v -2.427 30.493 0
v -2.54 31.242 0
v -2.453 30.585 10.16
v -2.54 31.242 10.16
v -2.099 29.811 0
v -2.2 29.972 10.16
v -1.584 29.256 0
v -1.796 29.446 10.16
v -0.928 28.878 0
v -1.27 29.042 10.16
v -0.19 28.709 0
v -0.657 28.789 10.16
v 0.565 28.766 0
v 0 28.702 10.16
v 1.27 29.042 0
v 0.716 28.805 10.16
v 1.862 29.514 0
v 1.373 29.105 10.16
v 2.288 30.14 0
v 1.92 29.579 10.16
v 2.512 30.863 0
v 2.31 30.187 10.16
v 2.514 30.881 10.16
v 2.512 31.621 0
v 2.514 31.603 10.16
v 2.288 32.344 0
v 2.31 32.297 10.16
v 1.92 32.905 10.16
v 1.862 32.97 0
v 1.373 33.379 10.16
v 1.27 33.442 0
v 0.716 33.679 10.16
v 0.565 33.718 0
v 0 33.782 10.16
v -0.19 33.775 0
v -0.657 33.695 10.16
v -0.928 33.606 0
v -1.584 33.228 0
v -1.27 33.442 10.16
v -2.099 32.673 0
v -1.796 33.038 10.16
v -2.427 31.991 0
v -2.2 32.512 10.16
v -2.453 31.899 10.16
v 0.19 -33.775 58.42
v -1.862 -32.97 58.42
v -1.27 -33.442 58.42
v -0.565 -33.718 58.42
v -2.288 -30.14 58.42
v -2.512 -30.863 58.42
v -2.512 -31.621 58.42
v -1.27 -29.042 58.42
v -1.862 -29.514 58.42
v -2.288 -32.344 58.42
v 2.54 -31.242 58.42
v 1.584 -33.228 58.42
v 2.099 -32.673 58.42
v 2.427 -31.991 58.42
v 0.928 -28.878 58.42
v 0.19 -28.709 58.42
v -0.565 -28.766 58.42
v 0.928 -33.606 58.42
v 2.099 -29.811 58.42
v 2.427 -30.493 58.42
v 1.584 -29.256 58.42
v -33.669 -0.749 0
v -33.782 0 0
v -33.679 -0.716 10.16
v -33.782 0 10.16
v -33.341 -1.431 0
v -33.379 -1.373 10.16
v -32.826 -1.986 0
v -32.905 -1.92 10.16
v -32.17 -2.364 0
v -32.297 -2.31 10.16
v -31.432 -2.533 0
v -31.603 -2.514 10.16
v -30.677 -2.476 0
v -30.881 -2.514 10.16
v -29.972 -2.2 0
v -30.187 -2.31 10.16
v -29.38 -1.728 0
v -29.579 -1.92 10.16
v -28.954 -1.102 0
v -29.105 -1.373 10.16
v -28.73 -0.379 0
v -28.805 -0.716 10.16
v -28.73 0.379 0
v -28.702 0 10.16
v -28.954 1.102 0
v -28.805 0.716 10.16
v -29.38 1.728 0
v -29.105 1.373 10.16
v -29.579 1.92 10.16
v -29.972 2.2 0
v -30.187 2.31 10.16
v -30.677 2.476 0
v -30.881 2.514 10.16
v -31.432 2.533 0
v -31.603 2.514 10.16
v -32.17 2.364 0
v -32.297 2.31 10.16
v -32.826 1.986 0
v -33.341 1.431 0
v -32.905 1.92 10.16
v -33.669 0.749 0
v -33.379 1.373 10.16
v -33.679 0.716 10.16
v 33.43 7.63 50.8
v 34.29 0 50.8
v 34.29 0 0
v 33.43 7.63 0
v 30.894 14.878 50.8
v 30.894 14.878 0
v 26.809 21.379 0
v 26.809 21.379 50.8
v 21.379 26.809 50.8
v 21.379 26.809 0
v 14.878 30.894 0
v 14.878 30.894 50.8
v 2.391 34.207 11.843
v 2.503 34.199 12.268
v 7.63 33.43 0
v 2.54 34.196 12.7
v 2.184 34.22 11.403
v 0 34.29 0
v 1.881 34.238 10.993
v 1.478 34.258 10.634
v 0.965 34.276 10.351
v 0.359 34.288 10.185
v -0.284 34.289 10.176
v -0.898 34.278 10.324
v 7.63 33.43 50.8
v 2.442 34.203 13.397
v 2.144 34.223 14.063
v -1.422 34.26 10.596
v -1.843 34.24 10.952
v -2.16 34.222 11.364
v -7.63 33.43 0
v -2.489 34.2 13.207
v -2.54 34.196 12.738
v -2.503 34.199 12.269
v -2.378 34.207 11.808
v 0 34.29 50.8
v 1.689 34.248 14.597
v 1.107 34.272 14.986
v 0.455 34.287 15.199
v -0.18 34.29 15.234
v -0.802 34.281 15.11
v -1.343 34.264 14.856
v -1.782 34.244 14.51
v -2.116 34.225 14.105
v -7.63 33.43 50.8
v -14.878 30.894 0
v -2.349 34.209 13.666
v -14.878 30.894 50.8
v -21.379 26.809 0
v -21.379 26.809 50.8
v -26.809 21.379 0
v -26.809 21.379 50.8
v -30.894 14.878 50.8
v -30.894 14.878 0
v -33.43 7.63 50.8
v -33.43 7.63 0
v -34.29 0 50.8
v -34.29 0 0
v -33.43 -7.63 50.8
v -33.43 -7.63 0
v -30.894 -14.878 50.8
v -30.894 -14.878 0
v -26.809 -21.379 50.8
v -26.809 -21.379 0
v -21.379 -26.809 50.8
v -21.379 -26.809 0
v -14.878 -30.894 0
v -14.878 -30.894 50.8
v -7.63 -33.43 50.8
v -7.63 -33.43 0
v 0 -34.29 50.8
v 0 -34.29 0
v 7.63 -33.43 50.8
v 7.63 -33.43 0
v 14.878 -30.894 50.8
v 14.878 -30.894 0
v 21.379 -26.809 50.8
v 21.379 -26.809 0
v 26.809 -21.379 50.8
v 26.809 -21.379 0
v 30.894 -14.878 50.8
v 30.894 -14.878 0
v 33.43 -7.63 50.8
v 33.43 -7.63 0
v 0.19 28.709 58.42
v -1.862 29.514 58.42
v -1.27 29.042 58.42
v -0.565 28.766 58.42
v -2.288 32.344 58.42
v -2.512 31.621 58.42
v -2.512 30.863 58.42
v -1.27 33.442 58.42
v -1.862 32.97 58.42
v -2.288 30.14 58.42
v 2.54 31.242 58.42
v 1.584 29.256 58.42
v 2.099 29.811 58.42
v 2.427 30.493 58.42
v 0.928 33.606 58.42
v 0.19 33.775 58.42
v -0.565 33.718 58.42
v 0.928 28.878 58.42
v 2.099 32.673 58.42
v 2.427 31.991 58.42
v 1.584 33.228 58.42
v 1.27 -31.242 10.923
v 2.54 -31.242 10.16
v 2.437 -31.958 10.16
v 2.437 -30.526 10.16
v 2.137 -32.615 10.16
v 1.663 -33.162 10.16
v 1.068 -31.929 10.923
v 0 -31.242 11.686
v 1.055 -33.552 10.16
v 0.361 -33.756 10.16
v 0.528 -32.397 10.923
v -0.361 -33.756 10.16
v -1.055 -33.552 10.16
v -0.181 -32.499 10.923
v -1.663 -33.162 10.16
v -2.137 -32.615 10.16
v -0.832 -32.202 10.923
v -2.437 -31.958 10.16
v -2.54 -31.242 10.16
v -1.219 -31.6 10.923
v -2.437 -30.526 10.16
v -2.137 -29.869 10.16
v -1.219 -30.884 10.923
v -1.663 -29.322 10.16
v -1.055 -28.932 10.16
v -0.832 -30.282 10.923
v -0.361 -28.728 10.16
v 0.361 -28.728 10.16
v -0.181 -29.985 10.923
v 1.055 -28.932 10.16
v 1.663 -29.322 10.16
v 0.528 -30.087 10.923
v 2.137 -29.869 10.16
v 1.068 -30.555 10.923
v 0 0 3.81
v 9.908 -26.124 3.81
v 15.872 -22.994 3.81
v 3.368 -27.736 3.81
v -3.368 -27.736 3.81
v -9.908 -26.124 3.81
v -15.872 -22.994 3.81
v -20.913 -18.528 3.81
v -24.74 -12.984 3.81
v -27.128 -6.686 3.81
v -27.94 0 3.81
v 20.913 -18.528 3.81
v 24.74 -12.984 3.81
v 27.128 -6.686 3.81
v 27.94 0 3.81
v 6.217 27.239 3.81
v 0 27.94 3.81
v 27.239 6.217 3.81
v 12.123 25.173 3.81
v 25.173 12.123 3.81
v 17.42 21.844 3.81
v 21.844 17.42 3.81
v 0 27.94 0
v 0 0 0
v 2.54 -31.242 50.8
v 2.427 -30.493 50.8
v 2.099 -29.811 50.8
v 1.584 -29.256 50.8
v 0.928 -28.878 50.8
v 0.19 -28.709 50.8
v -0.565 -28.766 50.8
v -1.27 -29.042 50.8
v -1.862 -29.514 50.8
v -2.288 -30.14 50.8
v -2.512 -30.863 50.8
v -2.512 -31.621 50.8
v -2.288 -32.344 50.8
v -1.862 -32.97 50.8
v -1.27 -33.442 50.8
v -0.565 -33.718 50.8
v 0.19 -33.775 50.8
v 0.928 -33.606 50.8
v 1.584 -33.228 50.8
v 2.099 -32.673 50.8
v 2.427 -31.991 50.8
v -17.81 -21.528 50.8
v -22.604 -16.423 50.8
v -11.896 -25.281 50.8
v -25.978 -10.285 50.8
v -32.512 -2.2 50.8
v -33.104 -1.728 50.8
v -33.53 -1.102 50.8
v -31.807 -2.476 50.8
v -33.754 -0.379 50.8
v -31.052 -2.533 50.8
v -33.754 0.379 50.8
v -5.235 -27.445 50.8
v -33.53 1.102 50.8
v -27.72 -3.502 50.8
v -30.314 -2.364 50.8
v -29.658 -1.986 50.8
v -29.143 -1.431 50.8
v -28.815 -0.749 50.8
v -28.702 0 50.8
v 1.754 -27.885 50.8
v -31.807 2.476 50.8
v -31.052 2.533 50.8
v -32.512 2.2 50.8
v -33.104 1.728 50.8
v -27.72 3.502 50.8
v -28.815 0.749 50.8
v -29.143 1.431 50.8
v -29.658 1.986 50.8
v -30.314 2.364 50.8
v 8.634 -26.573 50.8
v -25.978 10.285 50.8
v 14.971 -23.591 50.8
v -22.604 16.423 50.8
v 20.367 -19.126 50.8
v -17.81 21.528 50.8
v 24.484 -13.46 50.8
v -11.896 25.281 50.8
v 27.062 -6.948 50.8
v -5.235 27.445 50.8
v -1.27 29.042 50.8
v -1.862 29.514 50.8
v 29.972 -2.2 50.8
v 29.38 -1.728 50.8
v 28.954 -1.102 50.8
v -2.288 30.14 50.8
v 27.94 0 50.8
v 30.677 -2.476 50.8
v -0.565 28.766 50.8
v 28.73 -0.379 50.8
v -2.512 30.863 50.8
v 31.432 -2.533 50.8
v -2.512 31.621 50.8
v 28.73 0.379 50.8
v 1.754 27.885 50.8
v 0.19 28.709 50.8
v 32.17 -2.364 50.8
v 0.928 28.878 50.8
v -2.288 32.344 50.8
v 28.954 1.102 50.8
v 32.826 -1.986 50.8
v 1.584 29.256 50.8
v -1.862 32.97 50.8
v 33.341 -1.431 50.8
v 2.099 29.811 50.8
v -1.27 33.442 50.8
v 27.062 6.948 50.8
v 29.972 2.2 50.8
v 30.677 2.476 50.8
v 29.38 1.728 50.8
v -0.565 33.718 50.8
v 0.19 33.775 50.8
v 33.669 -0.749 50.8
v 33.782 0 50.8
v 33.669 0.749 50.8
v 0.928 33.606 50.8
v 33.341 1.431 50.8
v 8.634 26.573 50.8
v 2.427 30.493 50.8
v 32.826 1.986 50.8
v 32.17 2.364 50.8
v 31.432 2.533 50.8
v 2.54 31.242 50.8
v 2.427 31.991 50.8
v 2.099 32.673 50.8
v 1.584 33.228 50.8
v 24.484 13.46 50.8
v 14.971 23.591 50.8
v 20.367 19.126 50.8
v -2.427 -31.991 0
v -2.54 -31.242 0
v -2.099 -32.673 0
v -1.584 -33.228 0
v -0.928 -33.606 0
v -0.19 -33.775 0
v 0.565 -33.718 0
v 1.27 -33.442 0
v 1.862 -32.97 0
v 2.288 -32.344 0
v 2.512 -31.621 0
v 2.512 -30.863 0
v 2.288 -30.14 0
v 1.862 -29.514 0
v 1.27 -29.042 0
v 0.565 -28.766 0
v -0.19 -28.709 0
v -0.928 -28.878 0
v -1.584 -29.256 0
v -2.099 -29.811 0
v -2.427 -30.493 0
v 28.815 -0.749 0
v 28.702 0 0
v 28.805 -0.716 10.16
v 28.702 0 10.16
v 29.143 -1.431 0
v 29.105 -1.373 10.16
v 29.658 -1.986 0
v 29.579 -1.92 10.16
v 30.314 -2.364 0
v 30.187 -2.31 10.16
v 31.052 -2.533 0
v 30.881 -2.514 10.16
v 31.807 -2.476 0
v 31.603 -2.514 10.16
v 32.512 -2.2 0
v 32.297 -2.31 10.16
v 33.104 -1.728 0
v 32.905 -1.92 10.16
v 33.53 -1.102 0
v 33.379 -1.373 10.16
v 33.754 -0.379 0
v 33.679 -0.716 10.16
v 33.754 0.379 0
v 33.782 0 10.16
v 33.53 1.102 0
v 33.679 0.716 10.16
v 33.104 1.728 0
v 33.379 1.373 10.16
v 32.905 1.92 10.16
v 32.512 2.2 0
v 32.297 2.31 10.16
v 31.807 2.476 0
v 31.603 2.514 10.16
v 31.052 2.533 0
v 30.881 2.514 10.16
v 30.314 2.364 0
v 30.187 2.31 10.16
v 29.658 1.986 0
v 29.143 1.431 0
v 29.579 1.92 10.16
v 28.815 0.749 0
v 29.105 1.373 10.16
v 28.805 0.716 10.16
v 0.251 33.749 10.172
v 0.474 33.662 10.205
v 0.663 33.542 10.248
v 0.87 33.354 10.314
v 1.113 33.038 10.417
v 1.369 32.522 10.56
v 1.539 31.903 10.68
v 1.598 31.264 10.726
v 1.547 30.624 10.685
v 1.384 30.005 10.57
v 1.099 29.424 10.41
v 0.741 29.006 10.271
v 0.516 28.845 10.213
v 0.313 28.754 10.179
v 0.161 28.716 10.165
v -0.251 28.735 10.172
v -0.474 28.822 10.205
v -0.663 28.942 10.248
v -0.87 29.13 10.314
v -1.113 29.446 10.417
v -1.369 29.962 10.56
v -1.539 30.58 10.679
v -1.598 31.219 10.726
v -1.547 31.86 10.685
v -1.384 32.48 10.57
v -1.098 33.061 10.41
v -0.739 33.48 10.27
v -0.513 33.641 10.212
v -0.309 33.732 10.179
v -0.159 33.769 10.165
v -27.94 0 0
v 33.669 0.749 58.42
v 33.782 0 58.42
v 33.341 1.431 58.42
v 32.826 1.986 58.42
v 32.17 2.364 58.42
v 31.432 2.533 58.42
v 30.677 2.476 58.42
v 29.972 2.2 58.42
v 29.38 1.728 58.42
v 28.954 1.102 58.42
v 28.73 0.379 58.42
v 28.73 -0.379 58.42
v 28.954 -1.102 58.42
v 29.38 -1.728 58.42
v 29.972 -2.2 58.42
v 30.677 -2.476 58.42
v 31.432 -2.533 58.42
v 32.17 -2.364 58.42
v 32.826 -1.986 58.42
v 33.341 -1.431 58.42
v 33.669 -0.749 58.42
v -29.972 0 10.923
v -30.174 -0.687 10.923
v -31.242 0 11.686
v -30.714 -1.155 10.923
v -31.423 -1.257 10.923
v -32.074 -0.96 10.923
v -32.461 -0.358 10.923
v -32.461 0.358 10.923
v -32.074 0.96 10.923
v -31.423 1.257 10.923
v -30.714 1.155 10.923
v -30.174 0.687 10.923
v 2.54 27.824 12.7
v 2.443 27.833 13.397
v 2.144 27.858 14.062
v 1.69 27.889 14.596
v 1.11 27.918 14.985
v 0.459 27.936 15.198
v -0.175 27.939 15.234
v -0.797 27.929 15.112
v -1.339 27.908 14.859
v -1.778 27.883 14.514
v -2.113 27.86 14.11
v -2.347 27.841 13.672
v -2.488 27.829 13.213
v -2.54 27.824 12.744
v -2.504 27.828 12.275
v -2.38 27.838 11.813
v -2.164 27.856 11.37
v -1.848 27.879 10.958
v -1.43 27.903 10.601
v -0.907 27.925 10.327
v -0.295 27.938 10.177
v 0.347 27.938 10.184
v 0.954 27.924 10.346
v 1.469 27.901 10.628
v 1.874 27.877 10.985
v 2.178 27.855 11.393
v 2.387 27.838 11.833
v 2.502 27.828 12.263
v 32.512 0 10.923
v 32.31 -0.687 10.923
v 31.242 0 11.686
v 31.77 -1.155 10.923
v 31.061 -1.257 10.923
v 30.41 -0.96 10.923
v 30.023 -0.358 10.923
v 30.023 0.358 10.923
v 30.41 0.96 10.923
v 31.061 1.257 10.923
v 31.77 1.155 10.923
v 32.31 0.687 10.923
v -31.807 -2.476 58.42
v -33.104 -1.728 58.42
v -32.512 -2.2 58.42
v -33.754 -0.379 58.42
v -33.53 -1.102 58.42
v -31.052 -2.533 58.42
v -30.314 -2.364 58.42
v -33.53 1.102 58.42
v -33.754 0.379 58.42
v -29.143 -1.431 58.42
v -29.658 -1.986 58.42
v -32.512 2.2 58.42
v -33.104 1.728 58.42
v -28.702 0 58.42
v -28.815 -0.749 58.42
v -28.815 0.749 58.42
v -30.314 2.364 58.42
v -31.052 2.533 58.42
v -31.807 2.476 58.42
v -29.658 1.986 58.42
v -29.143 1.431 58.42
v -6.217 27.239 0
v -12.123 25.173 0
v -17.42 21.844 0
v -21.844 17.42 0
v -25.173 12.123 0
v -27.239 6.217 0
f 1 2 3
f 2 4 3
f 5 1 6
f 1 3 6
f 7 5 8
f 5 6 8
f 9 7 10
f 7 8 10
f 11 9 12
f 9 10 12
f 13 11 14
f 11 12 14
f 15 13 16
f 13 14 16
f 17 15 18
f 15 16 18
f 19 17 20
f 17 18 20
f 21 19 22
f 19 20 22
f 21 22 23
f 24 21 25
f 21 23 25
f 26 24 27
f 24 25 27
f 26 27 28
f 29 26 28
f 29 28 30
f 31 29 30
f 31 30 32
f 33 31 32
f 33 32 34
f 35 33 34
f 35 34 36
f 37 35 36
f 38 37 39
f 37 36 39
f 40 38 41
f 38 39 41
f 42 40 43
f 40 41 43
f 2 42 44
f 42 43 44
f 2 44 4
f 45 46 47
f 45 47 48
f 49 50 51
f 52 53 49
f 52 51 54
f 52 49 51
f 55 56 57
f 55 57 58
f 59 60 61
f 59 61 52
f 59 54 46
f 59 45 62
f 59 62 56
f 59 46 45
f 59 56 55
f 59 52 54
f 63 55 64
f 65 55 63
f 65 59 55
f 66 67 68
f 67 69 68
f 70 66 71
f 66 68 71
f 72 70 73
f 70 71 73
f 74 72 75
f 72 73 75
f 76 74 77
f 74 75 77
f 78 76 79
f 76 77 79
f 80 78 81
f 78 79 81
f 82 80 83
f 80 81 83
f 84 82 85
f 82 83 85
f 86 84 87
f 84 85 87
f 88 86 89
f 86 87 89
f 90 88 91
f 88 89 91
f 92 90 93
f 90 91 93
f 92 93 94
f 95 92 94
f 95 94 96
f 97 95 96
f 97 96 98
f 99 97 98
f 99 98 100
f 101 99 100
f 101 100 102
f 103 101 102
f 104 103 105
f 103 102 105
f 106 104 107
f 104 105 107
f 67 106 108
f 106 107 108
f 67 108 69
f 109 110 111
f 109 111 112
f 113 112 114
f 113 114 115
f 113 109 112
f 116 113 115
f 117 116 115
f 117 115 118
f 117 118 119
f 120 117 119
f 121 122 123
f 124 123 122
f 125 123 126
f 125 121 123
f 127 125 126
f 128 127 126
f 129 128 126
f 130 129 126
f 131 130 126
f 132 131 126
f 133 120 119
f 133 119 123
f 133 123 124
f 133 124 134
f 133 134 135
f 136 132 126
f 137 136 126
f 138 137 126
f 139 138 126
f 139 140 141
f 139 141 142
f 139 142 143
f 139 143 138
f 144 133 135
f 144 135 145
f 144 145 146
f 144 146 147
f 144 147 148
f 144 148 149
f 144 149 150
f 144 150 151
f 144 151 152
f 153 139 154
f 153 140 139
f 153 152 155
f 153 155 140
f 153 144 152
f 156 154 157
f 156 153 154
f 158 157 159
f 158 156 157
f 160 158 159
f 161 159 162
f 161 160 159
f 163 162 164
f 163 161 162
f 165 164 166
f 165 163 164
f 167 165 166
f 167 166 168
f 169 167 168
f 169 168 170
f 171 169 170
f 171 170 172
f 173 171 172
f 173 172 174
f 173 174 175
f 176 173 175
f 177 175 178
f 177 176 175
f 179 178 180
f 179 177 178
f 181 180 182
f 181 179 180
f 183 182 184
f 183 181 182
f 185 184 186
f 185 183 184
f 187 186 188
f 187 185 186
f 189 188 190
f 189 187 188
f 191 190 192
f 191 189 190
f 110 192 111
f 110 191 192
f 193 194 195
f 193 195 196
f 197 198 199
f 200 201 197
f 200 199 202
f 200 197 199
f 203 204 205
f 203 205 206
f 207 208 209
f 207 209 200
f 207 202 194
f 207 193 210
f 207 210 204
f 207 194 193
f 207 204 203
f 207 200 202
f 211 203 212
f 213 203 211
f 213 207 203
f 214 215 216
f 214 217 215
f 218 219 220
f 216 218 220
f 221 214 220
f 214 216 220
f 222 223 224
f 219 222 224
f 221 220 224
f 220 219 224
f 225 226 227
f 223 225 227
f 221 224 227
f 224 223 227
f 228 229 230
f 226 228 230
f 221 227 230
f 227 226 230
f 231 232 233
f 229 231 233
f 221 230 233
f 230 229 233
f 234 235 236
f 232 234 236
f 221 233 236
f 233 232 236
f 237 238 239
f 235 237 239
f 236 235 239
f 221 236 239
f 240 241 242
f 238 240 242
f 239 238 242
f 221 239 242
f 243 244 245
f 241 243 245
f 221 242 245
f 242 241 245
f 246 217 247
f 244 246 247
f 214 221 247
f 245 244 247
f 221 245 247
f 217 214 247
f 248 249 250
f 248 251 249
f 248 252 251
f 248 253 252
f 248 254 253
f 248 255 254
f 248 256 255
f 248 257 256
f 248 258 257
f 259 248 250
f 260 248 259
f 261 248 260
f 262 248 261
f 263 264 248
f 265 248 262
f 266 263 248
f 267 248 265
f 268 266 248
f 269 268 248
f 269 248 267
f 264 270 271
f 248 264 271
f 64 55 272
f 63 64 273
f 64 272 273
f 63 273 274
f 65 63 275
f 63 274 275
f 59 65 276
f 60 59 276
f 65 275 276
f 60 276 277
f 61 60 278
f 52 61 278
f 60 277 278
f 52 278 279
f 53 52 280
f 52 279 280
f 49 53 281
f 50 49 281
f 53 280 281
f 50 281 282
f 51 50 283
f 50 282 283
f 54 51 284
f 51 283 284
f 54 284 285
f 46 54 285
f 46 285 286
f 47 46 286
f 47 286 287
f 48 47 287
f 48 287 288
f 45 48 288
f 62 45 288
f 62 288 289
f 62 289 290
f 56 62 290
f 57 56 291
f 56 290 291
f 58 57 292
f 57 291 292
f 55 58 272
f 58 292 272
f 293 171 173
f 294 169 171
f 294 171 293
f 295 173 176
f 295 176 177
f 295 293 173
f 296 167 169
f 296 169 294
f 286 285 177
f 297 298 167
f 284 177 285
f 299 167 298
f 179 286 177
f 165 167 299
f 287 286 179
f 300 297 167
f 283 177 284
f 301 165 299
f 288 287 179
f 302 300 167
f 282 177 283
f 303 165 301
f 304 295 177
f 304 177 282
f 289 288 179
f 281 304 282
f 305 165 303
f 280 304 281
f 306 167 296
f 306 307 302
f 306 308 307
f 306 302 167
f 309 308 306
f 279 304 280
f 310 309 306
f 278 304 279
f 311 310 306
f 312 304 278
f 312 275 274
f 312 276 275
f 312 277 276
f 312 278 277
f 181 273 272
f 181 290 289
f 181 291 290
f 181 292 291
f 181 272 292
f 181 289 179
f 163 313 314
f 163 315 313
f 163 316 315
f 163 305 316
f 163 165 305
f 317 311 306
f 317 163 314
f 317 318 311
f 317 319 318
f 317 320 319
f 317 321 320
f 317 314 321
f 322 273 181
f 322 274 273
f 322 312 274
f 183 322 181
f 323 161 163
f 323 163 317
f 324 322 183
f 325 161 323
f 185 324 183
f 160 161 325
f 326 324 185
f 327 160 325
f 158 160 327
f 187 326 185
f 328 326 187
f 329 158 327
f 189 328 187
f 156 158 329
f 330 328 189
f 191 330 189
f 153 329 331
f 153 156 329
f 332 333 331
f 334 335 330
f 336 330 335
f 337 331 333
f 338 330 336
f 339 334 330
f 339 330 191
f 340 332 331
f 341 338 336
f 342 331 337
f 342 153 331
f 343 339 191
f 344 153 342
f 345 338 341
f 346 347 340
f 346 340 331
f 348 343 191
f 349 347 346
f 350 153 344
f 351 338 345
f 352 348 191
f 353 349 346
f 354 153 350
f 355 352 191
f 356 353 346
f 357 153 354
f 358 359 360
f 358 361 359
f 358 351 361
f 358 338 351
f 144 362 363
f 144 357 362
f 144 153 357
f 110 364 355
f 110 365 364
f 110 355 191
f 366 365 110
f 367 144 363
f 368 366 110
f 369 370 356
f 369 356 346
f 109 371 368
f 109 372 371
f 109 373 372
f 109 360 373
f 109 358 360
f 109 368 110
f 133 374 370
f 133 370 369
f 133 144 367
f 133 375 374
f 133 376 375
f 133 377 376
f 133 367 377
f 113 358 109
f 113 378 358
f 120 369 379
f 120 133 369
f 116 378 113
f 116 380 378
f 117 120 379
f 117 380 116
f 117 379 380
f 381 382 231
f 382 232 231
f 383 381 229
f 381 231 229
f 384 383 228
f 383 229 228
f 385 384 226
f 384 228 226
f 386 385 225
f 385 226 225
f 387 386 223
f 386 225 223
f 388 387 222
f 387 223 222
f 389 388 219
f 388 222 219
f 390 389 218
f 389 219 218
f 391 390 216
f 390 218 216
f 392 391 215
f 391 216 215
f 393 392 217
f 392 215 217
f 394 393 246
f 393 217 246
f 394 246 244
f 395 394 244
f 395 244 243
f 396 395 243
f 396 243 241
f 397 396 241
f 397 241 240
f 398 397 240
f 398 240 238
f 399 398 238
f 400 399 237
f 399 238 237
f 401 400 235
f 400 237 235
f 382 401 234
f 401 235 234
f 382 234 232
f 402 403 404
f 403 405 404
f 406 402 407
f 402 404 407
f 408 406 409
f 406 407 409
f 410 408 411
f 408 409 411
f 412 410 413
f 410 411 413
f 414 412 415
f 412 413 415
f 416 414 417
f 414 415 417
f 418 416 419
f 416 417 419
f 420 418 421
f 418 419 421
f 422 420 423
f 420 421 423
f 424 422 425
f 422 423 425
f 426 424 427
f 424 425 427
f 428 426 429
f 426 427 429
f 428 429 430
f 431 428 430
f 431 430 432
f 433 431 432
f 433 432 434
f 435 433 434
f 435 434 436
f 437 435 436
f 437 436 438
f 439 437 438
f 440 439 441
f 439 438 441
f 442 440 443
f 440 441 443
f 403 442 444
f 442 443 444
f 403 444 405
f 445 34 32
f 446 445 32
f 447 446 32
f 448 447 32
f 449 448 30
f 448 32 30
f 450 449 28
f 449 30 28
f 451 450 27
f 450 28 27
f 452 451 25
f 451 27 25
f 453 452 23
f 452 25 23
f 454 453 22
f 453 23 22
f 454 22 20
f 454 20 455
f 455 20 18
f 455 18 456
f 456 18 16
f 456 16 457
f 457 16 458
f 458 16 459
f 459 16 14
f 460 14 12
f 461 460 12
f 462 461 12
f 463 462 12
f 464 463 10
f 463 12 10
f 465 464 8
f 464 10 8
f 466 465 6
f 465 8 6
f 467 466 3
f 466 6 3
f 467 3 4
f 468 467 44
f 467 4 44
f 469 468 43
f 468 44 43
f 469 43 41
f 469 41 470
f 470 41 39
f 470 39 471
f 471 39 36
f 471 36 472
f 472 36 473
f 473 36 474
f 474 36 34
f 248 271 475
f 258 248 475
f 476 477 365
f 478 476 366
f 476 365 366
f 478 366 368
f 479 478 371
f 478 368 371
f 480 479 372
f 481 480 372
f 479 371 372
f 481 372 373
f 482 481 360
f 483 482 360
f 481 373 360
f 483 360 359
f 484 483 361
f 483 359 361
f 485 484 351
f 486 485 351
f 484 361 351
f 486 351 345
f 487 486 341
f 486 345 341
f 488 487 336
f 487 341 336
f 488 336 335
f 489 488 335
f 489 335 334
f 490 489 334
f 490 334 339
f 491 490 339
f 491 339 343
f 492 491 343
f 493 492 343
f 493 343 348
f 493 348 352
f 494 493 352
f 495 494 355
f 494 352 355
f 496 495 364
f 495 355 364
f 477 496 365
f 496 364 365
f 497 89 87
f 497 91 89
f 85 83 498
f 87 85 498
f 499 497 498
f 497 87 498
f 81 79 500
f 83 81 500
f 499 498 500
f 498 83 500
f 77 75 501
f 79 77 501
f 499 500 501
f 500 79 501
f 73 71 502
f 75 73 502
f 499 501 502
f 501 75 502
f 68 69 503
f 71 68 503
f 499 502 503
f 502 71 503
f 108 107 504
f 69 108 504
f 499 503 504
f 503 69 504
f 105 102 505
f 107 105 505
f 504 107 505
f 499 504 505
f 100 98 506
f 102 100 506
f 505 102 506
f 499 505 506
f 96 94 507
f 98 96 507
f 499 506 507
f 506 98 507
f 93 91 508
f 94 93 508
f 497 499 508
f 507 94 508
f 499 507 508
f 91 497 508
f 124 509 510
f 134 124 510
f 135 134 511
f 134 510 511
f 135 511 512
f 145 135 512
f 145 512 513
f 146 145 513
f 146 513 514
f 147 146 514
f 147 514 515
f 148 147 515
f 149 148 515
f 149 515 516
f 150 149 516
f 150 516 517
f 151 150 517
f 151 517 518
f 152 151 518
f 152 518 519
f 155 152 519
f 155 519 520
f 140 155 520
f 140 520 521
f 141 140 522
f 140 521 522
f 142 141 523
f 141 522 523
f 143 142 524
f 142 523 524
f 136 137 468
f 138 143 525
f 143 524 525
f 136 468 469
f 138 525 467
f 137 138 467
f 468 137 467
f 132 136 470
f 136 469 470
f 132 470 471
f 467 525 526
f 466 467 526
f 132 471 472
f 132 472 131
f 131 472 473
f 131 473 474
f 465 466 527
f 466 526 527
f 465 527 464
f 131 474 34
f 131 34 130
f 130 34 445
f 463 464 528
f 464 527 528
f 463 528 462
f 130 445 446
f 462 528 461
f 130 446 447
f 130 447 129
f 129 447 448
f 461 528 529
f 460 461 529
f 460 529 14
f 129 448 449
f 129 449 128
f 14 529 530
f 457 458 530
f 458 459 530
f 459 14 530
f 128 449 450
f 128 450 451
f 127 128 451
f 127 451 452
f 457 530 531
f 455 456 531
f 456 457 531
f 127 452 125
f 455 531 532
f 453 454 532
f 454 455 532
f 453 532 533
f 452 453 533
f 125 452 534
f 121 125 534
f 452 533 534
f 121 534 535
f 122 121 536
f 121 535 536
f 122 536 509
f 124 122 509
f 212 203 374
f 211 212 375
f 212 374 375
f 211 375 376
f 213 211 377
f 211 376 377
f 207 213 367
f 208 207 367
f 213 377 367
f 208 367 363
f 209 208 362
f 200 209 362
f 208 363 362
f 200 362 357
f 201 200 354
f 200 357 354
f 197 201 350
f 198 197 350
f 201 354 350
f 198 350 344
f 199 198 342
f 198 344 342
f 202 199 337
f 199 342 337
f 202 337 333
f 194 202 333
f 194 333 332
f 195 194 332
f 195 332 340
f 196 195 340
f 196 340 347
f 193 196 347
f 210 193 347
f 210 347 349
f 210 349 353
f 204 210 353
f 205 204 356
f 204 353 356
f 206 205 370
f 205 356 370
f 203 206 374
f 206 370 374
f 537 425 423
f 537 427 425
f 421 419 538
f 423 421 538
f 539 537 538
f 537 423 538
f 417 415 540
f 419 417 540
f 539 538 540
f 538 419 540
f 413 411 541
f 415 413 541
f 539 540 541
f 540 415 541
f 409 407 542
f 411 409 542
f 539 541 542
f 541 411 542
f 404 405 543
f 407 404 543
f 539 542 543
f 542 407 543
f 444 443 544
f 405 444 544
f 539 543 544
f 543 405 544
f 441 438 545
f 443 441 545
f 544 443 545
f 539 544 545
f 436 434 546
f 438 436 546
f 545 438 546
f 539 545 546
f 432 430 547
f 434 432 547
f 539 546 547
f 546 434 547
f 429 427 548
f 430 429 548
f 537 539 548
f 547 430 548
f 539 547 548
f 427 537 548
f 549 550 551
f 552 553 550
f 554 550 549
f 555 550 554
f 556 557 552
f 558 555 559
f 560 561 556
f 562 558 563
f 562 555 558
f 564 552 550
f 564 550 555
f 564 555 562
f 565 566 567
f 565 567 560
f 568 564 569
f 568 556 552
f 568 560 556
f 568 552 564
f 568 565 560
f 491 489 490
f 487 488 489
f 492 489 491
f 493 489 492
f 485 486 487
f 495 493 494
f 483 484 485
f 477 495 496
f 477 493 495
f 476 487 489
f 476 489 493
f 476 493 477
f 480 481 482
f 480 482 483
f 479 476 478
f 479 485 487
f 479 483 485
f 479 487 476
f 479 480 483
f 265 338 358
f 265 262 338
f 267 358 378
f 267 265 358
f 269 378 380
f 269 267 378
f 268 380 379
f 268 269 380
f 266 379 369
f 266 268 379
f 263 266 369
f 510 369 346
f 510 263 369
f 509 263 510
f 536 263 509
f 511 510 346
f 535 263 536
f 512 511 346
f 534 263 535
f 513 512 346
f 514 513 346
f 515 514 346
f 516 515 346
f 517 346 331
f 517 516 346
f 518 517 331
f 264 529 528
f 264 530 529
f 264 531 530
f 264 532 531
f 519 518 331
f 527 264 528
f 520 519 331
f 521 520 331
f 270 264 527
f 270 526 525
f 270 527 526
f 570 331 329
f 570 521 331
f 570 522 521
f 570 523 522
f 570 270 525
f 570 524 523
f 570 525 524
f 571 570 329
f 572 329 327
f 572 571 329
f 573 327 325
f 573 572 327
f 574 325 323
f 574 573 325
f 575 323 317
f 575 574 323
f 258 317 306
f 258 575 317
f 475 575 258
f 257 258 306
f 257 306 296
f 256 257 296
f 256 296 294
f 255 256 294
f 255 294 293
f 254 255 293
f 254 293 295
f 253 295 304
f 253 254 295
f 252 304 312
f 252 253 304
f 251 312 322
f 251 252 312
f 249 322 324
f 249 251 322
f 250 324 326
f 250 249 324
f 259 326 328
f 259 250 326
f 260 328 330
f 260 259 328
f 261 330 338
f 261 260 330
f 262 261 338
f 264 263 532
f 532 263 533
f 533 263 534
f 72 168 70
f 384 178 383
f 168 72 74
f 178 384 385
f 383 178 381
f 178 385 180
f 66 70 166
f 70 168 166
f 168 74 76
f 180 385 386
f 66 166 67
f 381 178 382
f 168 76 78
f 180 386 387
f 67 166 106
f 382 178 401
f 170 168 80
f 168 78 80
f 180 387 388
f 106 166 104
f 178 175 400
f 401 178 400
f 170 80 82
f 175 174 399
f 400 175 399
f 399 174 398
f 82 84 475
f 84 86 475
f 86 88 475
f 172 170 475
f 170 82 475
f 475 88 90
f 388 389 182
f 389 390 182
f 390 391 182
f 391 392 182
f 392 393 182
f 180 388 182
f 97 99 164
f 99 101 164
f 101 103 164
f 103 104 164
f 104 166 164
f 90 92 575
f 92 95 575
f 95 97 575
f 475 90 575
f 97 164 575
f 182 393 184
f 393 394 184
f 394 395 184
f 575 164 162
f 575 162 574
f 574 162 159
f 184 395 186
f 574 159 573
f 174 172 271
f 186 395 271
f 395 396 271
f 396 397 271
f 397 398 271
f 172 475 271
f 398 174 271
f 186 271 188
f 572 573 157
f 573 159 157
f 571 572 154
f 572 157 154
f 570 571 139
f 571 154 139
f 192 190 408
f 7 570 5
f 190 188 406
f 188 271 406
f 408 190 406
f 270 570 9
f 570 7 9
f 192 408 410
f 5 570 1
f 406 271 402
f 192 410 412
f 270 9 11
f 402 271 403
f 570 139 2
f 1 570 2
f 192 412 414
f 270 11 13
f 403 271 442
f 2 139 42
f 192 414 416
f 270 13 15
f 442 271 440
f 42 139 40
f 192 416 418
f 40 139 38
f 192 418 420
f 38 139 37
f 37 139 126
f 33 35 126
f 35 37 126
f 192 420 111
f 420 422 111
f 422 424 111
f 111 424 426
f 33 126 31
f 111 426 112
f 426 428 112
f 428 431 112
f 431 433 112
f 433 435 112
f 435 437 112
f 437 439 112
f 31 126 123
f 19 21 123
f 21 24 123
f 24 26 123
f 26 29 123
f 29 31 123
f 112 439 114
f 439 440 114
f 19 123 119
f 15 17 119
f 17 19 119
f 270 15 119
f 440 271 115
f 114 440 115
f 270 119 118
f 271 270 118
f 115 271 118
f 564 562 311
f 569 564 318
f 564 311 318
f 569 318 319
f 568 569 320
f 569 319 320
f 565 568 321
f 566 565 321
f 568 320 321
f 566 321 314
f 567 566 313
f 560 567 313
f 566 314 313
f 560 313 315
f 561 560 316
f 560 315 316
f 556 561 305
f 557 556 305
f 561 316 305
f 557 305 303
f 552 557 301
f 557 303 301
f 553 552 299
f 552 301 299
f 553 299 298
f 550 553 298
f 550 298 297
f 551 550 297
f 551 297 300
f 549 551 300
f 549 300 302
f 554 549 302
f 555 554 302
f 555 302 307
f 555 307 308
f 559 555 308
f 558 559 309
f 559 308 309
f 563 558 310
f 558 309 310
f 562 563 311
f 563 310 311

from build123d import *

# Parameters (mm, degrees)
F2_R     = 2.54
F3_DEPTH = 7.62
F4_D     = 5.08
F4_DEPTH = 34.291
F6_D     = 5.08
F6_DEPTH = 10.16
F6_TIP   = 1.5261859723
F8_DEPTH = 3.81


with BuildPart() as f1:
    # F0 (on Front) → F1 (revolve)
    with BuildSketch(Plane.XZ):
        Polygon((27.94, 20.2932615928), (27.94, 0), (34.29, 0), (34.29, 50.8), (27.94, 50.8), align=None)
    revolve(axis=Axis((0, 0, 10.1466307964), (0, 0, 1)))

    # F2 (on face) → F3 (join)
    with BuildSketch(Plane.XY.offset(50.8)):
        with Locations((0, 31.242)):
            Circle(F2_R)
        with Locations((31.242, 0)):
            Circle(F2_R)
        with Locations((0, -31.242)):
            Circle(F2_R)
        with Locations((-31.242, 0)):
            Circle(F2_R)
    extrude(amount=F3_DEPTH)

    # F4 (through all, one way)
    with BuildSketch(Plane.XZ):
        with Locations((0, 12.7)):
            Circle(F4_D / 2)
    extrude(amount=-F4_DEPTH, mode=Mode.SUBTRACT)

    # F6
    with Locations(Plane(origin=(0, 0, 0), x_dir=(1, 0, 0), z_dir=(0, 0, -1))):
        with Locations((0, 31.242), (31.242, 0), (0, -31.242), (-31.242, 0)):
            Hole(F6_D / 2, depth=F6_DEPTH)
            with Locations((0, 0, -(F6_DEPTH + F6_TIP / 2))):  # 118° drill point
                Cone(0, F6_D / 2, F6_TIP, mode=Mode.SUBTRACT)

    # F7 (on Top) → F8 (join)
    with BuildSketch(Plane.XY):
        with BuildLine():
            Line((0, 0), (-28.1686, 0))
            ThreePointArc((-28.1686, 0), (19.9182080765, -19.9182080765), (0, 28.1686))
            Line((0, 28.1686), (0, 0))
        make_face()
    extrude(amount=F8_DEPTH)


solid = f1.part
